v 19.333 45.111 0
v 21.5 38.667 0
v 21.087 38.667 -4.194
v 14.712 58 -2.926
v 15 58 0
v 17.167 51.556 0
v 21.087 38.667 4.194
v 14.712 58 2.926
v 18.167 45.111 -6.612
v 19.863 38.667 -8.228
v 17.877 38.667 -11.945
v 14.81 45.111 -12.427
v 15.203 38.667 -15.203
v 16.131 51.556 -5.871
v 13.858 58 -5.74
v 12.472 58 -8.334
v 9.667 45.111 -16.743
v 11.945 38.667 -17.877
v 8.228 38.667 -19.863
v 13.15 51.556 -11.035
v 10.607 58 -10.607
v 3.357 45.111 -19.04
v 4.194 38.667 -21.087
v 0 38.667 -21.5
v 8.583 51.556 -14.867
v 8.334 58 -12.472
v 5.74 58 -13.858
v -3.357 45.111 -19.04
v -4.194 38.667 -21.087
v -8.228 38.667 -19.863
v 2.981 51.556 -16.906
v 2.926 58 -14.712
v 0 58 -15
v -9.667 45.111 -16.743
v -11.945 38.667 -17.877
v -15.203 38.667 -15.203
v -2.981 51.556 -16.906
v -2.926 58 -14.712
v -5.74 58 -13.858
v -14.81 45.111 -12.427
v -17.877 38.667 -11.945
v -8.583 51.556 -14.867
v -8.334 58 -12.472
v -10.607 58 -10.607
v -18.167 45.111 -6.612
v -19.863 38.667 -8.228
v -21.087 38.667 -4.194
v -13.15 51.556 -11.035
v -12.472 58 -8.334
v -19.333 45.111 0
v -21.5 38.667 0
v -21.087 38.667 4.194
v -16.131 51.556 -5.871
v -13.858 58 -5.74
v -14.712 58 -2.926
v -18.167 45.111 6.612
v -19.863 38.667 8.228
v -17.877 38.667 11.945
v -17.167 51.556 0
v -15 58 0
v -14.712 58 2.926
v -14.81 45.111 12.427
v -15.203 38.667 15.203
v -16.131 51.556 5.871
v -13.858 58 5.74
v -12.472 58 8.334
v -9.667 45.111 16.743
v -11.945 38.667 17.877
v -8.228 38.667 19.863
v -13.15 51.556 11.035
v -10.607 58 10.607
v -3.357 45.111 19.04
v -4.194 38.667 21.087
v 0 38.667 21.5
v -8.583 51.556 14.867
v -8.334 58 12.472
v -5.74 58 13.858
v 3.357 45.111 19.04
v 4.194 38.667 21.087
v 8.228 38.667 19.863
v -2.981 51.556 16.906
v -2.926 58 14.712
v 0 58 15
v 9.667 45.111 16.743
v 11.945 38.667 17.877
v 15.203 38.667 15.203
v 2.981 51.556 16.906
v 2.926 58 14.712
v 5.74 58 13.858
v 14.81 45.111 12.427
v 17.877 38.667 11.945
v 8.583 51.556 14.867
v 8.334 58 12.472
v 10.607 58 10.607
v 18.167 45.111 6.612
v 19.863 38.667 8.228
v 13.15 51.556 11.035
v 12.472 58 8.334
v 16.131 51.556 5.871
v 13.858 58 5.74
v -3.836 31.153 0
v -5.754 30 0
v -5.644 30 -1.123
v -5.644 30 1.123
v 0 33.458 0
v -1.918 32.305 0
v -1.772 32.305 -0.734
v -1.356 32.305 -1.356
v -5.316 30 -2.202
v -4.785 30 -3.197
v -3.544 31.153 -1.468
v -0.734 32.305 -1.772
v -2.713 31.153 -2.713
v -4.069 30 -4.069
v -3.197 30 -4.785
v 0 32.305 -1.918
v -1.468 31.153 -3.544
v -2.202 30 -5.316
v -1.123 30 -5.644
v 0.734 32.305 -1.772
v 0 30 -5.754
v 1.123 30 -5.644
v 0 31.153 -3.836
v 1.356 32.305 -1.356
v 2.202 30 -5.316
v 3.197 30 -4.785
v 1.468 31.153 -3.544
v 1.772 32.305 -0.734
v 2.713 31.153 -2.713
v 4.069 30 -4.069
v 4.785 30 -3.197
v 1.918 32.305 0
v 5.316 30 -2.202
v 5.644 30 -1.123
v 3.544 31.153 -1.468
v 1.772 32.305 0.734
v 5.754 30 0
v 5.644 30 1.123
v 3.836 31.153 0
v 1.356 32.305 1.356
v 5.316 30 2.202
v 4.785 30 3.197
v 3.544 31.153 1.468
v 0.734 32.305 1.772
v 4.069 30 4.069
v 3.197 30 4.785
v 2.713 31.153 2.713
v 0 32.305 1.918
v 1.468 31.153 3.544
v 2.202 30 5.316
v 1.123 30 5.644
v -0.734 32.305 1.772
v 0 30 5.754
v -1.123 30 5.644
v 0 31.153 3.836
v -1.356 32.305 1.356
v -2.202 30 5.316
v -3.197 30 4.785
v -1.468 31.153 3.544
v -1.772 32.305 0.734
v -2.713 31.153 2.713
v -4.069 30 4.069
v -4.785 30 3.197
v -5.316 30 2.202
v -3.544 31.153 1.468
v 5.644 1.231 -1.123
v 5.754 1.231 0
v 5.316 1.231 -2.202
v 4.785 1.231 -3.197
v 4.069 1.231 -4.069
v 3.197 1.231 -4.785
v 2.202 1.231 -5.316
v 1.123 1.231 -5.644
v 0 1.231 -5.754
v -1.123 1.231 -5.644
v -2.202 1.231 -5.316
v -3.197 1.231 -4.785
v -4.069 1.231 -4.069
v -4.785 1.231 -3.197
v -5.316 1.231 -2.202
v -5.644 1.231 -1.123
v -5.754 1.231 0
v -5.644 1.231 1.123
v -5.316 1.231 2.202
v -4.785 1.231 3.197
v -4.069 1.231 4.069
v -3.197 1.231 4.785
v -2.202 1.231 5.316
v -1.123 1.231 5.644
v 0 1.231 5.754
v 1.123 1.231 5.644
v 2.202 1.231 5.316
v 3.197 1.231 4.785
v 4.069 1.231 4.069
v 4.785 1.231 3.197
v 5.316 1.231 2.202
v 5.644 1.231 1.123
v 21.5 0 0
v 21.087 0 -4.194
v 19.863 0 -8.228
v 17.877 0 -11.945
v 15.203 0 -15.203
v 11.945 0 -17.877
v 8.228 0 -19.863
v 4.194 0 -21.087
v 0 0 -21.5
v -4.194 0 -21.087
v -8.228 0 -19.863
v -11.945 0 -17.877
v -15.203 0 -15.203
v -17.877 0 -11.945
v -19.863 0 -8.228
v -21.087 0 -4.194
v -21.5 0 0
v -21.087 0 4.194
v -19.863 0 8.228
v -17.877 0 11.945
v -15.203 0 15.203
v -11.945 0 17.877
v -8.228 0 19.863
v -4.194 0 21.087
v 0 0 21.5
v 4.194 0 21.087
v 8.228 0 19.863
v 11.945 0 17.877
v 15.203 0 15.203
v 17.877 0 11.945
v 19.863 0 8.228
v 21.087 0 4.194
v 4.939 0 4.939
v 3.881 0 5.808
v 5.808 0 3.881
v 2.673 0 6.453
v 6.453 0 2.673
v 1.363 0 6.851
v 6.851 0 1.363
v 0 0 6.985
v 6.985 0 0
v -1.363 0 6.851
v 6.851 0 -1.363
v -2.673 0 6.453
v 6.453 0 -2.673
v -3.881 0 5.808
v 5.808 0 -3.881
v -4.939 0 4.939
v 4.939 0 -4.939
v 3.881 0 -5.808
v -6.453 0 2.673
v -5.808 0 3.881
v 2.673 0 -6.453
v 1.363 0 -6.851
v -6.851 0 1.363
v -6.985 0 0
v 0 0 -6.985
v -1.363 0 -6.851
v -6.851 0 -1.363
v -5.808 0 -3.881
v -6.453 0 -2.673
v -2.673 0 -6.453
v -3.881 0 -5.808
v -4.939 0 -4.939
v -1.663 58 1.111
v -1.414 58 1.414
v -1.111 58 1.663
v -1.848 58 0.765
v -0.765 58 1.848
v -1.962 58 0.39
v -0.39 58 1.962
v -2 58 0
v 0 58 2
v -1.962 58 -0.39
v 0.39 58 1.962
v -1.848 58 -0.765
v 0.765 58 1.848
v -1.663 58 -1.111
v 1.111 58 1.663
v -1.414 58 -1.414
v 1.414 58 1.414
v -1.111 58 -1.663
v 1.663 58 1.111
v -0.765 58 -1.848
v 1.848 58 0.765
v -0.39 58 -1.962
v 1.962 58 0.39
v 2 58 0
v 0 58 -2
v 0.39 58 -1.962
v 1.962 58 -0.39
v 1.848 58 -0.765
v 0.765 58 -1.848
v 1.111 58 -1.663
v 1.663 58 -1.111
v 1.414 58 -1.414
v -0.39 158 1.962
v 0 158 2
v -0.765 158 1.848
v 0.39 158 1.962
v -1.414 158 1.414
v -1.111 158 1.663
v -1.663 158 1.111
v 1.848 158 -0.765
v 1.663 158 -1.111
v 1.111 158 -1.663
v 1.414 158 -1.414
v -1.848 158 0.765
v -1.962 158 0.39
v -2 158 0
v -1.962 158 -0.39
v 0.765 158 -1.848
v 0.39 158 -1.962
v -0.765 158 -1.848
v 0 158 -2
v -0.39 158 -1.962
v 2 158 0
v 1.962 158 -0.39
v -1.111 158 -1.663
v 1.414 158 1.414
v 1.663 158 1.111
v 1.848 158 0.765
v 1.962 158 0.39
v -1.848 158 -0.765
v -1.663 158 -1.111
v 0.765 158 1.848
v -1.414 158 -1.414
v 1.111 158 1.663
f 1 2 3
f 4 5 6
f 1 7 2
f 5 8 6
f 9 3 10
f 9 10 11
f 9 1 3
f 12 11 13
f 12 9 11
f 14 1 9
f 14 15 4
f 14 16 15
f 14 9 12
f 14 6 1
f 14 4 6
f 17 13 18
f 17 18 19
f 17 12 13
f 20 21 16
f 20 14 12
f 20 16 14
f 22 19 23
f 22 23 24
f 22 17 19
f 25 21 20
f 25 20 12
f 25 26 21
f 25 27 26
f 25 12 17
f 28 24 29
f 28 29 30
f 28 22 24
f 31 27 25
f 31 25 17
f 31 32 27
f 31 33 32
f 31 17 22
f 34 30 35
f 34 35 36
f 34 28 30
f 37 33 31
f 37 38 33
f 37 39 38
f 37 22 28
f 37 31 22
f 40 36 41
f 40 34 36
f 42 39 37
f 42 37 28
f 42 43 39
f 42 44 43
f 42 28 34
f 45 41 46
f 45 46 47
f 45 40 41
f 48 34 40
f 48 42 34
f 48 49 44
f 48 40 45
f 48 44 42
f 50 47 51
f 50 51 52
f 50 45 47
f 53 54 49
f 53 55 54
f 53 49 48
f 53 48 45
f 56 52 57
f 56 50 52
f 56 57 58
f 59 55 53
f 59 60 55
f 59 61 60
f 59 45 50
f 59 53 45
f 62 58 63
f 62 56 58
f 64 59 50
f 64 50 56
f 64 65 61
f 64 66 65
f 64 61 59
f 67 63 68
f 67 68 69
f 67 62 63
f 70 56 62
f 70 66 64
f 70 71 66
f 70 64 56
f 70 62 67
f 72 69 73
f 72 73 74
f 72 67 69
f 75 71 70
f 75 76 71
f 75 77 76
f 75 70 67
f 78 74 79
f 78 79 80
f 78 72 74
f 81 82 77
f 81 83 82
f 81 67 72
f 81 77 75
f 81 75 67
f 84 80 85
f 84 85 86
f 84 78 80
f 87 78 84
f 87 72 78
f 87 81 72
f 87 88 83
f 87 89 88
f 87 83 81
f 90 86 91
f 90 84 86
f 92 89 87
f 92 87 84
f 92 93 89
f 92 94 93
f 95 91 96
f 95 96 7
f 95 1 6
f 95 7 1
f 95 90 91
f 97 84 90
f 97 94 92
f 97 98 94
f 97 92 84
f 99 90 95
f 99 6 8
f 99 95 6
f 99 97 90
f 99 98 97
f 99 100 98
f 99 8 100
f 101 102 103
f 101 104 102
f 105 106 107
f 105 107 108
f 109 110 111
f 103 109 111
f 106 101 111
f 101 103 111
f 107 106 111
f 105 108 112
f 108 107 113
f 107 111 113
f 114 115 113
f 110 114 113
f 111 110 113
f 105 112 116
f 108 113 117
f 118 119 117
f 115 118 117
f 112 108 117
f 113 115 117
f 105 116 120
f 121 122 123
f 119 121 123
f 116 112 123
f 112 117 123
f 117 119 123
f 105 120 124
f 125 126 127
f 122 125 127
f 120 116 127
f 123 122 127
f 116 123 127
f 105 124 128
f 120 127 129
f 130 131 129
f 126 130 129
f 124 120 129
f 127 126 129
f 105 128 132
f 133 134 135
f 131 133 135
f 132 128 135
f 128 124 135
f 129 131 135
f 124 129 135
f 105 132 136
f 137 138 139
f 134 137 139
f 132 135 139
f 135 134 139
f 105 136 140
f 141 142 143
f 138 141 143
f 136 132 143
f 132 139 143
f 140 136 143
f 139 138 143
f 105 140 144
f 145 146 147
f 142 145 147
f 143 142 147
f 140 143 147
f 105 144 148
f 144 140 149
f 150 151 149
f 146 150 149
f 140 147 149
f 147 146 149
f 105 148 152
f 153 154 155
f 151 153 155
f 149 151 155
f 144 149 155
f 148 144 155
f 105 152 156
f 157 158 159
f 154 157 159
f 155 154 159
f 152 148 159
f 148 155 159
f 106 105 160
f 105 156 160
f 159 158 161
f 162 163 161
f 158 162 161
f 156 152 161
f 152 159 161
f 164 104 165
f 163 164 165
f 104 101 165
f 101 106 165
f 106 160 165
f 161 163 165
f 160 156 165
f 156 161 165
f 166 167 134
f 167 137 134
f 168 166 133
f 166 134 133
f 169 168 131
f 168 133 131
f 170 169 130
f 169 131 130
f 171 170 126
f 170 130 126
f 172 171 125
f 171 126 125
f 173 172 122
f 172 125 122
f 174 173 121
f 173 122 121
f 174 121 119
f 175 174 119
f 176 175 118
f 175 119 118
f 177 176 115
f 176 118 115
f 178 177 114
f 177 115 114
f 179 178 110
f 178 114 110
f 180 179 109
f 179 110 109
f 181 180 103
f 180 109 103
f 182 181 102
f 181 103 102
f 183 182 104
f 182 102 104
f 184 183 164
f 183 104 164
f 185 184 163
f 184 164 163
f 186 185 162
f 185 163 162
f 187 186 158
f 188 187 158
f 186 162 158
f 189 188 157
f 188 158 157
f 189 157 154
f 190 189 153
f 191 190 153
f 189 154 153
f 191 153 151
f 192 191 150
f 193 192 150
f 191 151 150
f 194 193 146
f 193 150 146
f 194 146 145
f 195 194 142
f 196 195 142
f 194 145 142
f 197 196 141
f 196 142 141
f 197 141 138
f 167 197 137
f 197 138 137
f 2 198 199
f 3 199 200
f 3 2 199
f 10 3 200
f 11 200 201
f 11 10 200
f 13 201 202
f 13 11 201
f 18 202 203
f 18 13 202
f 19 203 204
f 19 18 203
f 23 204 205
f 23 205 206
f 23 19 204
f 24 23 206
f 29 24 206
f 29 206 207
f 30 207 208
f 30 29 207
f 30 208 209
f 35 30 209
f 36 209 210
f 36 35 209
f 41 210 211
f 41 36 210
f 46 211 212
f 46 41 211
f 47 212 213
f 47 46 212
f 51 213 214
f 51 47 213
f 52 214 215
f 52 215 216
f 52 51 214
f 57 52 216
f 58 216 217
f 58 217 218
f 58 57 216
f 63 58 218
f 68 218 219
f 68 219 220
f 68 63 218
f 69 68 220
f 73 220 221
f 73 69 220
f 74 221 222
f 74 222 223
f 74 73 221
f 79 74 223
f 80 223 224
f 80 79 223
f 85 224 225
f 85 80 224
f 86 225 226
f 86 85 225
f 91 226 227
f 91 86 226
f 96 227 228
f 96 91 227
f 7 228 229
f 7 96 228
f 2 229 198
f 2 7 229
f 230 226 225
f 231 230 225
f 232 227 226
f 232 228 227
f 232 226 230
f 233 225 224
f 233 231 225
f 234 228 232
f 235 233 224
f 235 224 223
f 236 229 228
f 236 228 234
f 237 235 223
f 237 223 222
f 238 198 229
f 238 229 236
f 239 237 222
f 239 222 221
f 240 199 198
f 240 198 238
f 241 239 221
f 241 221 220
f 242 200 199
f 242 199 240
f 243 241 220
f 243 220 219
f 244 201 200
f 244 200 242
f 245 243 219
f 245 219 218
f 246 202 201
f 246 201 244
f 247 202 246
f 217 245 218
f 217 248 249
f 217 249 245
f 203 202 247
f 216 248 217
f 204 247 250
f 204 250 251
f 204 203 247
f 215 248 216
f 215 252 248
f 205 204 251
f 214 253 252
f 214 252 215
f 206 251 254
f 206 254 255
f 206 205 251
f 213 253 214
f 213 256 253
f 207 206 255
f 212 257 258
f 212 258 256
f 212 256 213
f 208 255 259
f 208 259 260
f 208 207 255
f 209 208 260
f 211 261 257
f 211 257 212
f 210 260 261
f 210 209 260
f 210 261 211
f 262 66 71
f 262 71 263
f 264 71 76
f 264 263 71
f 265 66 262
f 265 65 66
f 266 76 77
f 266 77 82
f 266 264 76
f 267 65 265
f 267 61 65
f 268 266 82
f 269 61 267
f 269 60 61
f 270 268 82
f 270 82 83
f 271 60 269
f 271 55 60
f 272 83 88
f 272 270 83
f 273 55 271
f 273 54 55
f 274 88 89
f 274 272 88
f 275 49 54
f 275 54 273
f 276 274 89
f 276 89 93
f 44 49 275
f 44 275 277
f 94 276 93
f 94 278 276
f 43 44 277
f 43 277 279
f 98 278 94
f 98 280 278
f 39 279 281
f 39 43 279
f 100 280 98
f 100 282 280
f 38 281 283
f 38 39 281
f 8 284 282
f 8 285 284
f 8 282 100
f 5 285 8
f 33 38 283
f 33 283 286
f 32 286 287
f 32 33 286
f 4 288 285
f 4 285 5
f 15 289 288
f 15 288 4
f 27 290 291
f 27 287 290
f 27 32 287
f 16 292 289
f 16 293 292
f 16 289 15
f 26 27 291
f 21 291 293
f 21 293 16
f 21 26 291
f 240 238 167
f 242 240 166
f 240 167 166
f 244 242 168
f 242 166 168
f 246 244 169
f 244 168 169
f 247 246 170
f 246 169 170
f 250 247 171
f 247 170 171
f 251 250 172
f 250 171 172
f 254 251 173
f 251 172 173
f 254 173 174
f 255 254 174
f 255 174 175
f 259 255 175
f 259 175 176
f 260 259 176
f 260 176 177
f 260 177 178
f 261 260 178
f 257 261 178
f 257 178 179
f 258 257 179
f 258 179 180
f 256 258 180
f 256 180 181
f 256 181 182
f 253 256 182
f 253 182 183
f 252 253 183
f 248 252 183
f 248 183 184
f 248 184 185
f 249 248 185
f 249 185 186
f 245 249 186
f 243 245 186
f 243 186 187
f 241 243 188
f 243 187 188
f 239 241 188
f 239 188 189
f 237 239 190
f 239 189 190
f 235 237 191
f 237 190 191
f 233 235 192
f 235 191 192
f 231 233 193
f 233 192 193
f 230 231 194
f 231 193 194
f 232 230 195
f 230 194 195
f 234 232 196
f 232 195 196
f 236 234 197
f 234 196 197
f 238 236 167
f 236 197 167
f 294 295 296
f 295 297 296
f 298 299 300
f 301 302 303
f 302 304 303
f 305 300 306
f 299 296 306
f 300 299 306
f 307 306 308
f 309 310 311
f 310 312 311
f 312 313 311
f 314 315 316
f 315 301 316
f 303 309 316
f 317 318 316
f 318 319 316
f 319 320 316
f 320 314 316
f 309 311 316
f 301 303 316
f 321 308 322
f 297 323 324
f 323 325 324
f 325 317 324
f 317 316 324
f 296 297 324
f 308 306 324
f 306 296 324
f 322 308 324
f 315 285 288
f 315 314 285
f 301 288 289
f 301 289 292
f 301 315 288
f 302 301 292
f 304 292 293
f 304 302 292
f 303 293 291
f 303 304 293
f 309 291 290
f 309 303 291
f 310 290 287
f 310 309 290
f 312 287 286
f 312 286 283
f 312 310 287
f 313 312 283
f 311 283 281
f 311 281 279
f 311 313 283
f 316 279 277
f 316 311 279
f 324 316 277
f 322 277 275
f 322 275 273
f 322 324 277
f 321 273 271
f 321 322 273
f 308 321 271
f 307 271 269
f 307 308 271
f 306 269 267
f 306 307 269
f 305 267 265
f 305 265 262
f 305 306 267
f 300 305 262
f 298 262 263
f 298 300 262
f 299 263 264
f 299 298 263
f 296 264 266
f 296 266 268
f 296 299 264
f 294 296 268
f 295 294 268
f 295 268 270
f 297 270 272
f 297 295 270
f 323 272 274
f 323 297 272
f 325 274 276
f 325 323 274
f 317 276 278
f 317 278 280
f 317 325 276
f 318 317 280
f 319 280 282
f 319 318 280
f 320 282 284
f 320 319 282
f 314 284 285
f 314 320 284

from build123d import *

# Parameters (mm, degrees)
SKETCH1_W                         = 2
SKETCH1_H                         = 100
F_1_2_20_TAPPED_HOLE1_D           = 11.50874
F_1_2_20_TAPPED_HOLE1_DEPTH       = 30
F_1_2_20_TAPPED_HOLE1_CSINK_D     = 13.97
F_1_2_20_TAPPED_HOLE1_CSINK_ANGLE = 90
F_1_2_20_TAPPED_HOLE1_TIP         = 3.45757432


with BuildPart() as part:
    # Sketch1 → Revolve1 (revolve)
    with BuildSketch(Plane.XY):
        Polygon((0, 58), (0, 0), (21.5, 0), (21.5, 38.666666667), (15, 58), (2, 58), align=None)
        with Locations((1, 108)):
            Rectangle(SKETCH1_W, SKETCH1_H)
    revolve(axis=Axis((0, 0, 0), (0, 1, 0)))

    # 1/2-20 Tapped Hole1
    with Locations(Plane(origin=(0, 0, 0), x_dir=(-1, 0, 0), z_dir=(0, -1, 0))):
        with Locations((0, 0)):
            CounterSinkHole(F_1_2_20_TAPPED_HOLE1_D / 2, F_1_2_20_TAPPED_HOLE1_CSINK_D / 2, depth=F_1_2_20_TAPPED_HOLE1_DEPTH, counter_sink_angle=F_1_2_20_TAPPED_HOLE1_CSINK_ANGLE)
            with Locations((0, 0, -(F_1_2_20_TAPPED_HOLE1_DEPTH + F_1_2_20_TAPPED_HOLE1_TIP / 2))):  # 118° drill point
                Cone(0, F_1_2_20_TAPPED_HOLE1_D / 2, F_1_2_20_TAPPED_HOLE1_TIP, mode=Mode.SUBTRACT)


solid = part.part
